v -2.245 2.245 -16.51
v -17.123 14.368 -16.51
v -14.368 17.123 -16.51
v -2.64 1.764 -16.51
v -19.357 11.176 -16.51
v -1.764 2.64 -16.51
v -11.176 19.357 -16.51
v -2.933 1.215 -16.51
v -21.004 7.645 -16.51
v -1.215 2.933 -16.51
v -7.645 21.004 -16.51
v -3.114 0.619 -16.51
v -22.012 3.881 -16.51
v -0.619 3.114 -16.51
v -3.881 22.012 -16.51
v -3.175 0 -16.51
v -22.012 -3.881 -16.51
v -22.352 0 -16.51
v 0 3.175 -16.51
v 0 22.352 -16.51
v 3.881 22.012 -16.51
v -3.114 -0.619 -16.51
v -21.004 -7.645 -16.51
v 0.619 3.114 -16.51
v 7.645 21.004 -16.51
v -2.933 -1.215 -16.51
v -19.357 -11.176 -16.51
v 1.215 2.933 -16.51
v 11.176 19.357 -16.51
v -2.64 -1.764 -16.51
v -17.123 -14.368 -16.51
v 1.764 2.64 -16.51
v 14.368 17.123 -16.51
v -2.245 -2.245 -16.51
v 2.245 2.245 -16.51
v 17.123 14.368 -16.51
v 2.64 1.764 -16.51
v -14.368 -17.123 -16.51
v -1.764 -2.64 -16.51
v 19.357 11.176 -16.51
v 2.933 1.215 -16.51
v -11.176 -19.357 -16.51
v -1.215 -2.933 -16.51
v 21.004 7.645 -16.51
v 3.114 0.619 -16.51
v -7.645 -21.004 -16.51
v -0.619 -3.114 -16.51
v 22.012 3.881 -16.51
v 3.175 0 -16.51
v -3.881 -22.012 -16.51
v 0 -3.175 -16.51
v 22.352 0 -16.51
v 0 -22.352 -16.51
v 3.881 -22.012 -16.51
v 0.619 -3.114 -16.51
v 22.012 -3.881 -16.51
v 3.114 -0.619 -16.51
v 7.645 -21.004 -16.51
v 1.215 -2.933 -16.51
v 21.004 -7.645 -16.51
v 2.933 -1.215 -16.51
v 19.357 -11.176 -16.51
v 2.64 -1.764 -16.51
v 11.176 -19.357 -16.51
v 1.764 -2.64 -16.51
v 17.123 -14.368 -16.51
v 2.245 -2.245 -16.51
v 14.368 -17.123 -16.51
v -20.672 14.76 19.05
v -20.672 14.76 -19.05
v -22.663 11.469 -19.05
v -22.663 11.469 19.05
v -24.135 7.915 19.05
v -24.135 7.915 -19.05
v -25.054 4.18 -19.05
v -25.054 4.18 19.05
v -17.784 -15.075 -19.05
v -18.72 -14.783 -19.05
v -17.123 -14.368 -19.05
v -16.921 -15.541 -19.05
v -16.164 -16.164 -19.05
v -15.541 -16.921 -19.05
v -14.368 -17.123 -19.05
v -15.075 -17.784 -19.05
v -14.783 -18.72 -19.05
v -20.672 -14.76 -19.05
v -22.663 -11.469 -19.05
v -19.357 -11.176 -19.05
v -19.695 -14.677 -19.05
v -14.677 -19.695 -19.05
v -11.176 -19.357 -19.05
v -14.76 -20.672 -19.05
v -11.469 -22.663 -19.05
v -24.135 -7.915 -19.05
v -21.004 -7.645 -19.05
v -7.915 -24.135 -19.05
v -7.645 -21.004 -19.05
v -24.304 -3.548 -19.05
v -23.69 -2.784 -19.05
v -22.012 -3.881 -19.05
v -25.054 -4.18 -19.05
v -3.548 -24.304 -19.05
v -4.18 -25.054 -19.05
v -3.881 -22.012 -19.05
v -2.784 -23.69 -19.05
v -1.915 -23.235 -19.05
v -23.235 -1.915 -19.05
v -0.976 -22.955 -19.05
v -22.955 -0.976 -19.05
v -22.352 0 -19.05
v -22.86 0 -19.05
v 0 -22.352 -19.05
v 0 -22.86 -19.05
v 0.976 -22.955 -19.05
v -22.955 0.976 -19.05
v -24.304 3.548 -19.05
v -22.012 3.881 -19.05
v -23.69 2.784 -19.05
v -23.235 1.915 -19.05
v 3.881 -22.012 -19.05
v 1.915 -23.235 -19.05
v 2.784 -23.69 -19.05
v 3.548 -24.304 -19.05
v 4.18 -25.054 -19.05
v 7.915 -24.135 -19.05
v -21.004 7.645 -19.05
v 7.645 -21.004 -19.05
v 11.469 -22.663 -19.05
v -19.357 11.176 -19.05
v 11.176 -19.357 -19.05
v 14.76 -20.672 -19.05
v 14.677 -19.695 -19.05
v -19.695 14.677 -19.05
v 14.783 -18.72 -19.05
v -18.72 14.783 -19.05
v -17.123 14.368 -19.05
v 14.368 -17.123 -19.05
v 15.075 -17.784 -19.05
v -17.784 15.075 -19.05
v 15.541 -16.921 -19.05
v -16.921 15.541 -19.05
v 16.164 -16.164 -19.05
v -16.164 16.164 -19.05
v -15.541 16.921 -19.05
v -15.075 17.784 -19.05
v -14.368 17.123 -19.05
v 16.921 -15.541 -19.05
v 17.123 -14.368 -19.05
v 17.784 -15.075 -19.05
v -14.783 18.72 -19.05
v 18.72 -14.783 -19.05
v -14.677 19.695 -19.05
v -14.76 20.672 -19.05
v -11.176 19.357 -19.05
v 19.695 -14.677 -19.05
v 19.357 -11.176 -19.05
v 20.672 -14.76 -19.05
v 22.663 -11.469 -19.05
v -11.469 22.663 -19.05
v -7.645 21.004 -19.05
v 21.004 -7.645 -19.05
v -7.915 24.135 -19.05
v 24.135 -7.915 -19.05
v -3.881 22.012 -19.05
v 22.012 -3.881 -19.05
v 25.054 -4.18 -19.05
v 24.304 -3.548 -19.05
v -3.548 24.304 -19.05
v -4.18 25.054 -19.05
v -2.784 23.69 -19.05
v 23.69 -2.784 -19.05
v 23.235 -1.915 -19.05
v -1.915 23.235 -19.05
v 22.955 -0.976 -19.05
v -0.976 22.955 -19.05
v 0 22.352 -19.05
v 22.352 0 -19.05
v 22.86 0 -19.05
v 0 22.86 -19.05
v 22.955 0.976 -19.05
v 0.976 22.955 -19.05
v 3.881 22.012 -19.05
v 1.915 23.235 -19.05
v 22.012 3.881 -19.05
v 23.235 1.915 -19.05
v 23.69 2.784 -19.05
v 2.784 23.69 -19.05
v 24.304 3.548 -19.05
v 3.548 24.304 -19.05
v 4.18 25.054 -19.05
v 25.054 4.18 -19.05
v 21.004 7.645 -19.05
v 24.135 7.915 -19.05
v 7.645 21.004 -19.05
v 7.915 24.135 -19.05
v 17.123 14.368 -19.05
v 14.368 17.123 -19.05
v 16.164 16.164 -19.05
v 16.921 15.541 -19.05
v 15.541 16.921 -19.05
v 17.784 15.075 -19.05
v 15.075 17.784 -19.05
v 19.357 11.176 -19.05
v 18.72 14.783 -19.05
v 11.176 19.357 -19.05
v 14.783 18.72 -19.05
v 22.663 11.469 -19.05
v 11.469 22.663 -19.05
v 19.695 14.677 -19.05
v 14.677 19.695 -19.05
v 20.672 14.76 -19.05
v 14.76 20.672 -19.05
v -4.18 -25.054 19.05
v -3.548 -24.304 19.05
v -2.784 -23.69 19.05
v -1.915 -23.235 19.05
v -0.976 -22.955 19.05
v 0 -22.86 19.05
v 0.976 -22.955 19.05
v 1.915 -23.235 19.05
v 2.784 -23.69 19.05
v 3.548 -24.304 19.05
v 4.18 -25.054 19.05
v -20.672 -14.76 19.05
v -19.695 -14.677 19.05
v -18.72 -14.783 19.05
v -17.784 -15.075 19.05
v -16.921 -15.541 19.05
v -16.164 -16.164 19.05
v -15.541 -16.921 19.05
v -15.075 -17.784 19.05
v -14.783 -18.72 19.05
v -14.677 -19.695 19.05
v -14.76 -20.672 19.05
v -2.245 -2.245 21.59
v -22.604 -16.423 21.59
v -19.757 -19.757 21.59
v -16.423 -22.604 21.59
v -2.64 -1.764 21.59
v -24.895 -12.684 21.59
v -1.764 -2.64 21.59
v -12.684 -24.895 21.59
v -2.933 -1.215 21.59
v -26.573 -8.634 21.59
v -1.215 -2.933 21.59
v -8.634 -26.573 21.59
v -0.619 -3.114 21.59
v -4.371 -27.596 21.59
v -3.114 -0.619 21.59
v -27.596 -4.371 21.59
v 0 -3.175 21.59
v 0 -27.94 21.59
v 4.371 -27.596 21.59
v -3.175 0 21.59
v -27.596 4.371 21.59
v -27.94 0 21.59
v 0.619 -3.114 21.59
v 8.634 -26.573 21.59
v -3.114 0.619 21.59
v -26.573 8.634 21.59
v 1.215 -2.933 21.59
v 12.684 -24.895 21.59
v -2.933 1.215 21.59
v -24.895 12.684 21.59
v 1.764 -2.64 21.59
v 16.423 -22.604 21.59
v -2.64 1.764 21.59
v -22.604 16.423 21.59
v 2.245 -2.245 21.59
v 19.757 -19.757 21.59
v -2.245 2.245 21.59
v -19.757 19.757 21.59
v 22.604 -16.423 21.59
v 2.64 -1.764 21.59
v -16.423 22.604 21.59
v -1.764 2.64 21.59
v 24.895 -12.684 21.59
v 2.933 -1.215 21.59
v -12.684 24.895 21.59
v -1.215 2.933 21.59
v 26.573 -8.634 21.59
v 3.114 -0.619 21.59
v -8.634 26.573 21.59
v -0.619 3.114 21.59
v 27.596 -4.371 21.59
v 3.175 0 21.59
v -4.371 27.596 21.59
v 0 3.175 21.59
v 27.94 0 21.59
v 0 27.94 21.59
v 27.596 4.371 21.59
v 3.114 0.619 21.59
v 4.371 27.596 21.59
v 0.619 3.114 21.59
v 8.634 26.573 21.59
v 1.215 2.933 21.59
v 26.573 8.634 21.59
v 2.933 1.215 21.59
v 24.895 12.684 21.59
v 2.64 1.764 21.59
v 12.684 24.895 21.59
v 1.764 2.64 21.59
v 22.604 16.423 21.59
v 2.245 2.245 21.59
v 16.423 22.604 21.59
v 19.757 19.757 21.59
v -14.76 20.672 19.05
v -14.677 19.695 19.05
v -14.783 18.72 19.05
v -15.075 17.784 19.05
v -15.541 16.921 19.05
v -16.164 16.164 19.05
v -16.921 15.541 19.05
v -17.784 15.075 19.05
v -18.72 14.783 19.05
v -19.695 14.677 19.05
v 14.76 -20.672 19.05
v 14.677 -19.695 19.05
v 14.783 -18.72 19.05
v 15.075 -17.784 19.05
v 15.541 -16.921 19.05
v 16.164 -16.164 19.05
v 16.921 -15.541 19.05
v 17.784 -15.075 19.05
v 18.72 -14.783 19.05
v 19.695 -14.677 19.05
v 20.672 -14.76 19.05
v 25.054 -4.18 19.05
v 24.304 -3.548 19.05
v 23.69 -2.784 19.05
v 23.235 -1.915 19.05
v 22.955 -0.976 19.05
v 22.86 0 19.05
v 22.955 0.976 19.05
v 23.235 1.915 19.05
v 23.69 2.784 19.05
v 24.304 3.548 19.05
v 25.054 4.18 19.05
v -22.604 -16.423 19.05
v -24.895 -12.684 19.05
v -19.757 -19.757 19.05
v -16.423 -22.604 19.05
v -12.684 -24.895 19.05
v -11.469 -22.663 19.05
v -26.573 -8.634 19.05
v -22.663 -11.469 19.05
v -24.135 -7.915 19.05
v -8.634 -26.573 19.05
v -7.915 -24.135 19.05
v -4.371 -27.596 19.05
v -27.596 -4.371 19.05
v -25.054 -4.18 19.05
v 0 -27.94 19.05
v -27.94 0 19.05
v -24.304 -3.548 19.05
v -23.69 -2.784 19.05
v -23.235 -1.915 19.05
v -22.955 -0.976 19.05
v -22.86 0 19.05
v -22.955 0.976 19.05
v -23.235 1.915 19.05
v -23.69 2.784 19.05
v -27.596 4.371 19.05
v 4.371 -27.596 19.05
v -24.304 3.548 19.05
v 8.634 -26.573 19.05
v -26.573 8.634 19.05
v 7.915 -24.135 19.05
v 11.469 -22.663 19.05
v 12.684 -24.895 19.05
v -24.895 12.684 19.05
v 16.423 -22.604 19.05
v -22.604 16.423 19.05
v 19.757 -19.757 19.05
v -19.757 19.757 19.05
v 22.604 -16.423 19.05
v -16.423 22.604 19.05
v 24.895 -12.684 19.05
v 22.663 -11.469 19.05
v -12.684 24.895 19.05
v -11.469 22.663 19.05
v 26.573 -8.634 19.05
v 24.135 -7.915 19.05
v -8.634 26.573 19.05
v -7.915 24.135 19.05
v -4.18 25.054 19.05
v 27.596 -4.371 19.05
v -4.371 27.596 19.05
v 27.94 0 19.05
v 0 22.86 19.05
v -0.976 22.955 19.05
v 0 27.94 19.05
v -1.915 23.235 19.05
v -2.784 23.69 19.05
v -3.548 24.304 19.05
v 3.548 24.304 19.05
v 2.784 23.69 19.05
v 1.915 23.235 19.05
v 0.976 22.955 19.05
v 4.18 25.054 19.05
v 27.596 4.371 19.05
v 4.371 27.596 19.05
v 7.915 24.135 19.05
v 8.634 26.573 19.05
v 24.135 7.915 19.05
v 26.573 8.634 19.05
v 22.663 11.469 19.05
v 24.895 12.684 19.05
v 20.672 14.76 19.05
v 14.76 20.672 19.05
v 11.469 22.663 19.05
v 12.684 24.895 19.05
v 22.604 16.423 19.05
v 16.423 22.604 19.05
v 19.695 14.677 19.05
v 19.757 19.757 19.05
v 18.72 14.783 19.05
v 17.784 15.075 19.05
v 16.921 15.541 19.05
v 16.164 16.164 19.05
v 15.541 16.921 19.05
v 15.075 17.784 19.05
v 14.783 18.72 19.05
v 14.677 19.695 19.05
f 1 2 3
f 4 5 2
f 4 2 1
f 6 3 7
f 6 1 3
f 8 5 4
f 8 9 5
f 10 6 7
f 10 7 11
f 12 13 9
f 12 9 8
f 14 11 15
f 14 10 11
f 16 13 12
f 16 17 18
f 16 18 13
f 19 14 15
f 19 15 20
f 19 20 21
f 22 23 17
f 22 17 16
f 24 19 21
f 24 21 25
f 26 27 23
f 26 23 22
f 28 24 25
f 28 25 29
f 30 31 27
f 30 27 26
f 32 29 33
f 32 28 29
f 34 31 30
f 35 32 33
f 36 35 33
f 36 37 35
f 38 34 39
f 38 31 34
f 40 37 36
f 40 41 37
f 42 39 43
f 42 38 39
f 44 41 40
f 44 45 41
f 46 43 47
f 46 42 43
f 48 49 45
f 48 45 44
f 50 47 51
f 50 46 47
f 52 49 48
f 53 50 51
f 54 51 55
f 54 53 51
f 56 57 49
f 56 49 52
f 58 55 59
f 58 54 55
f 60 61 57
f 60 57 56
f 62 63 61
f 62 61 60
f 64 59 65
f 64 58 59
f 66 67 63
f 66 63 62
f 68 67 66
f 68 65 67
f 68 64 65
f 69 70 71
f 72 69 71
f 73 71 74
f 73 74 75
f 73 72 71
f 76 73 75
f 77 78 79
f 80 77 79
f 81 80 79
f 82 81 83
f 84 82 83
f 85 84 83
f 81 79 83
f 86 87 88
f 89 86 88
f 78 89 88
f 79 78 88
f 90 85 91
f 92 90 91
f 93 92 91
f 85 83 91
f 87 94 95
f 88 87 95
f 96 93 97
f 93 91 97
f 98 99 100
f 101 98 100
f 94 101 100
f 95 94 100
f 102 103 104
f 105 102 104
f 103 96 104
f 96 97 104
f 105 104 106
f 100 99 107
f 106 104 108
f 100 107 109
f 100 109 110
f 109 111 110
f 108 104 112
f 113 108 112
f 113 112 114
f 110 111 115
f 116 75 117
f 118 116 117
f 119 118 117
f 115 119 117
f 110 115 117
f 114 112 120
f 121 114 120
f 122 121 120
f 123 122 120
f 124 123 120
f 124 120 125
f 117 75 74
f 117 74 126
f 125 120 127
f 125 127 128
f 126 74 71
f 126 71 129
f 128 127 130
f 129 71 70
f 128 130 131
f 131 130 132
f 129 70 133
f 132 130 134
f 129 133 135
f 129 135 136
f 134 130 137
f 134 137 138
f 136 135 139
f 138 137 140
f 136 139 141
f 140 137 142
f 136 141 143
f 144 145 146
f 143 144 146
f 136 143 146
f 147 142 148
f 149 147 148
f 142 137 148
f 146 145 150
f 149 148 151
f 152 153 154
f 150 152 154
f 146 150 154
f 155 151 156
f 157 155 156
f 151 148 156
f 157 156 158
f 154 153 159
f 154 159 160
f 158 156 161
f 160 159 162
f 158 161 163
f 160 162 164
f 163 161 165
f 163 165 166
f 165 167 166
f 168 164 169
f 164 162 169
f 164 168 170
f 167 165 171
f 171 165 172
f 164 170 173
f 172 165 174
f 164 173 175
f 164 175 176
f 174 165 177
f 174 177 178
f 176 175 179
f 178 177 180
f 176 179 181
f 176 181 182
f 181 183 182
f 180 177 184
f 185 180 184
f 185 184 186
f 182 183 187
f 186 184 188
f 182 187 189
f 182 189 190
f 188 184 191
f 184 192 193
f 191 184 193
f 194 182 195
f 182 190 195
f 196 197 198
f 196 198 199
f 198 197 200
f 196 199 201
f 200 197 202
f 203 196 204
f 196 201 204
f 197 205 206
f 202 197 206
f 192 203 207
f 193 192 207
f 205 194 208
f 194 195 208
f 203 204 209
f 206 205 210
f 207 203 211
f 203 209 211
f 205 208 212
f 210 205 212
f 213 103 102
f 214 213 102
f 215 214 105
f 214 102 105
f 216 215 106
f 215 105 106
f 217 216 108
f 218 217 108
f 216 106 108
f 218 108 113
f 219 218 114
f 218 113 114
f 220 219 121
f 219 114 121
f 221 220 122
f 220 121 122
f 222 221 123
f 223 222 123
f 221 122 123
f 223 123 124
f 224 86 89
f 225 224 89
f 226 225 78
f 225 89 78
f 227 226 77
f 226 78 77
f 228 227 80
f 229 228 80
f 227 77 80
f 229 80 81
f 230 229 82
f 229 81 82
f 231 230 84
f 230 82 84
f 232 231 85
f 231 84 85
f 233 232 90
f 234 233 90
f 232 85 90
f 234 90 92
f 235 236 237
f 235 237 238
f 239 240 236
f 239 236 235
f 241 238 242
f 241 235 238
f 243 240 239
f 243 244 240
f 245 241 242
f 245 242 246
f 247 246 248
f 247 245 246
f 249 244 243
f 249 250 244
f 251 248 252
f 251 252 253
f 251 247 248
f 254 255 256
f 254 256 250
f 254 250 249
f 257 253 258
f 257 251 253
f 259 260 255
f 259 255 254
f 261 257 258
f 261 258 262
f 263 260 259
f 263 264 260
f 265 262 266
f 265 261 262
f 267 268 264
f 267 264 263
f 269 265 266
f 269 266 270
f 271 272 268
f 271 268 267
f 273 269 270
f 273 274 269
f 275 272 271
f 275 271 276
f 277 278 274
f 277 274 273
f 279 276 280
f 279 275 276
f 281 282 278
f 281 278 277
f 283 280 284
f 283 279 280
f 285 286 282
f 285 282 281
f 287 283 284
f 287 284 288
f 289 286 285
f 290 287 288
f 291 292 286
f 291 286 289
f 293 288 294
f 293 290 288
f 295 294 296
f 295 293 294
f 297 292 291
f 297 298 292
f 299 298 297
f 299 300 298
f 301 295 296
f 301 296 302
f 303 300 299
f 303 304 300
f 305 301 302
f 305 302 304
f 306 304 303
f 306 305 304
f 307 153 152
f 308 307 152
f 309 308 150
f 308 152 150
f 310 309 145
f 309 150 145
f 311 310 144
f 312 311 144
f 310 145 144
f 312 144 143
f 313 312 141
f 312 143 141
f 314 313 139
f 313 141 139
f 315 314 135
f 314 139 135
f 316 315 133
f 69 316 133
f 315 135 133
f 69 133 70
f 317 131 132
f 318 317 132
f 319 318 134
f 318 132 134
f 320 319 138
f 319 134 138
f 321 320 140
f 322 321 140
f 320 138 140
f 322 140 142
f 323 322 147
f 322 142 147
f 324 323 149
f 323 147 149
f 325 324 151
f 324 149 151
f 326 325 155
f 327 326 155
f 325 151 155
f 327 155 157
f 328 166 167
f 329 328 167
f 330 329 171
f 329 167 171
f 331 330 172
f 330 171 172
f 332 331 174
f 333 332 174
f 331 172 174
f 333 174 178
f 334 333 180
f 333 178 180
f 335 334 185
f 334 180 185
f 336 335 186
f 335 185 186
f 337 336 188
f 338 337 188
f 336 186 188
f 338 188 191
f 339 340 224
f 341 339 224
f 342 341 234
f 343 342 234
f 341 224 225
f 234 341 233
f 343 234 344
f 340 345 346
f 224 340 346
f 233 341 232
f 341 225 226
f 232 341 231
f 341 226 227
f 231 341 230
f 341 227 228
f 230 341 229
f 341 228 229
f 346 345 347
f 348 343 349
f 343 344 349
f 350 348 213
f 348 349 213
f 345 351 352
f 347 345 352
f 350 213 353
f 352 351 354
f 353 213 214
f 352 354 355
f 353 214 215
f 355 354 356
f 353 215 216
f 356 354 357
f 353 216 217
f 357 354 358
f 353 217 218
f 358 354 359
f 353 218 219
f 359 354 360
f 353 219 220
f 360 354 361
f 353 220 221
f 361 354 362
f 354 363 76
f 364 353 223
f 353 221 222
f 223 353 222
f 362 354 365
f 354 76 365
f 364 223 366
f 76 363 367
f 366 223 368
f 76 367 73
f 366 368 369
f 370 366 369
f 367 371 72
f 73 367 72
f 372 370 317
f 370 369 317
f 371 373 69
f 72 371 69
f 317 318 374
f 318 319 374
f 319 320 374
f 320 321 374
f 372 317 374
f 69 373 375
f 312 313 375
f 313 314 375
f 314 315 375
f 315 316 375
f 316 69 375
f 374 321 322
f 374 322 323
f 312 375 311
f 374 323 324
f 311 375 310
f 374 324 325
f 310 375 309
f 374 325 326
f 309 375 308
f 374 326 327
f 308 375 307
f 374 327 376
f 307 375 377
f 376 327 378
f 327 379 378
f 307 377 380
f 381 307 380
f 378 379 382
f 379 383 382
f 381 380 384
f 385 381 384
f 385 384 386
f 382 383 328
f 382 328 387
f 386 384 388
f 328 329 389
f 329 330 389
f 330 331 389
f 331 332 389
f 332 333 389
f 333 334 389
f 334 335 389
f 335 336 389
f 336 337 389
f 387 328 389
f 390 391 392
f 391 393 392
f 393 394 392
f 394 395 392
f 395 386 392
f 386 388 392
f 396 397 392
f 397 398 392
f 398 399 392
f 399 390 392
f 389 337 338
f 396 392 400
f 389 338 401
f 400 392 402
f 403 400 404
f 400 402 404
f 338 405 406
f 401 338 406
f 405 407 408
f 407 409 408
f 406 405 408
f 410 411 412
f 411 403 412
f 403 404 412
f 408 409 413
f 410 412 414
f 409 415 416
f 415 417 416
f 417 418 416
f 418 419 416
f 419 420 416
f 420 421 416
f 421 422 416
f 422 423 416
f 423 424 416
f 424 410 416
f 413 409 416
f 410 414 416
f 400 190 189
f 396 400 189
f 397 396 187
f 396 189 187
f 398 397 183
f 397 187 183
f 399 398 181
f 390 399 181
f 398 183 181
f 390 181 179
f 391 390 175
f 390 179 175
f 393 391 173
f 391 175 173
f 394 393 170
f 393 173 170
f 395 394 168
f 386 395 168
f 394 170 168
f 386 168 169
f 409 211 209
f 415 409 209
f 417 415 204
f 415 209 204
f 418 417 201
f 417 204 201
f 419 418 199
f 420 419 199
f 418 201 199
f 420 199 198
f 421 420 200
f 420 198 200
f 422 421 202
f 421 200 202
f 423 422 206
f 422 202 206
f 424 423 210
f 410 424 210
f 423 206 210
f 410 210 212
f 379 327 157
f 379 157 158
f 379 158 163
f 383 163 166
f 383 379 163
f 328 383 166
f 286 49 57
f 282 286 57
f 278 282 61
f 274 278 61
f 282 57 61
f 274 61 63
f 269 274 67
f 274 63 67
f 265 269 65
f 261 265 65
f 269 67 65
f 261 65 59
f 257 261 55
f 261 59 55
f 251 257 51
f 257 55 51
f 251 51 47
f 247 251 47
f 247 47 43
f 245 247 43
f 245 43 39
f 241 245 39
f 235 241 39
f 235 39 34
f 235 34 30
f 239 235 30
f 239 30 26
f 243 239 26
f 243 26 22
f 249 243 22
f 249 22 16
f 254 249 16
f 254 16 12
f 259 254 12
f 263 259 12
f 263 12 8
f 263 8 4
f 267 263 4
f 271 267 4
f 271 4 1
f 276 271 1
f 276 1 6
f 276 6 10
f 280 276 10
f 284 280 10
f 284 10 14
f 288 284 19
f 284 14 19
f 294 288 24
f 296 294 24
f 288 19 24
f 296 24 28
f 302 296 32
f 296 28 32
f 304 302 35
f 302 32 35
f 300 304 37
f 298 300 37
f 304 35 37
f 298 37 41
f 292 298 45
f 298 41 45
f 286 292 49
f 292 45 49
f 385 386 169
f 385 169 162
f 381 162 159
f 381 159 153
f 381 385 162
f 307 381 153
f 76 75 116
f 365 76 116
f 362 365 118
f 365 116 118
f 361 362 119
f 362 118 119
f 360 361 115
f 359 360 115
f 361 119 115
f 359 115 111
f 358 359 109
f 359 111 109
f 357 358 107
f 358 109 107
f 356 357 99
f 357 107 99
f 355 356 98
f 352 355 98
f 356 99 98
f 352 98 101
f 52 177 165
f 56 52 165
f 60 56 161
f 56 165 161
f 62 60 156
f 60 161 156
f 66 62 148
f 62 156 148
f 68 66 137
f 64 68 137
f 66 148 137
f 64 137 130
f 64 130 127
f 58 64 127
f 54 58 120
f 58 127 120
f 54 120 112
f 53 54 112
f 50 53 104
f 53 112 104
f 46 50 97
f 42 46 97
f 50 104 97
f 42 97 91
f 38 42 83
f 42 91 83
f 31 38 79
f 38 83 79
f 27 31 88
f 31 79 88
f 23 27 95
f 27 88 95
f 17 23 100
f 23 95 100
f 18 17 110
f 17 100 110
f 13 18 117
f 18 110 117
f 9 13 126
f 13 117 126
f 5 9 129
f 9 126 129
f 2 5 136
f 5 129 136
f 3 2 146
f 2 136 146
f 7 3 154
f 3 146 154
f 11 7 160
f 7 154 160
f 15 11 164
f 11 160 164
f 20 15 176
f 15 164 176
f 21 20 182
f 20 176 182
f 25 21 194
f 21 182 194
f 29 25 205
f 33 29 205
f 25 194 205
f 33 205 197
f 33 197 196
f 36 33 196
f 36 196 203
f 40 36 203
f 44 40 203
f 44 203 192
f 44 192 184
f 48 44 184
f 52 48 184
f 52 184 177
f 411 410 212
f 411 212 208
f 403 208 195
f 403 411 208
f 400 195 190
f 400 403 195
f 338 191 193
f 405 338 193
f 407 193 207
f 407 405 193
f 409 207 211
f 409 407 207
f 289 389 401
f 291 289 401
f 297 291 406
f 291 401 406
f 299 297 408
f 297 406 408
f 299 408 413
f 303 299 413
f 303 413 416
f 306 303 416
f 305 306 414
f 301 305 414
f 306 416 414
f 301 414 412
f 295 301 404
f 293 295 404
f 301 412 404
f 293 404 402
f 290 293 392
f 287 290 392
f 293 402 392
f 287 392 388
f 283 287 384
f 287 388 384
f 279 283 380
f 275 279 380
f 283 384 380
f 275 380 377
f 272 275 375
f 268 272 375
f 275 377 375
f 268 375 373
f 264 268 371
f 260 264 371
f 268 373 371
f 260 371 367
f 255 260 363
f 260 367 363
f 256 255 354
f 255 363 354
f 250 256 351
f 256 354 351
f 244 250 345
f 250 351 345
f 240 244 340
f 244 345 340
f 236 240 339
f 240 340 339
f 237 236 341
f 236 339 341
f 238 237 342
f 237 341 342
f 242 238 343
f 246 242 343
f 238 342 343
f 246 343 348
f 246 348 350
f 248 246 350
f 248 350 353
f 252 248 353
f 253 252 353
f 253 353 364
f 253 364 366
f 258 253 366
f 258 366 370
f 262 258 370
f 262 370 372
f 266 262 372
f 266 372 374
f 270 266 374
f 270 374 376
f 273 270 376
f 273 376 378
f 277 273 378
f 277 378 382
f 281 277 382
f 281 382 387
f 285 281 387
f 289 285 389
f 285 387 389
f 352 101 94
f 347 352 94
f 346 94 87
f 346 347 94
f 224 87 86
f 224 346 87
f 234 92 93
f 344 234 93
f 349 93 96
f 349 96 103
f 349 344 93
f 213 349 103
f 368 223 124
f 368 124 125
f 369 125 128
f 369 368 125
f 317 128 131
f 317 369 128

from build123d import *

# Parameters (mm, degrees)
F0_R            = 25.4
F1_DEPTH        = 19.05
F2_R            = 27.94
F2_R_2          = 25.4
F3_DEPTH        = 2.54
F4_R            = 22.352
F5_DEPTH        = 2.54
F6_R            = 3.175
F7_DEPTH        = 38.101
F9_DEPTH        = 38.1
F9_COPIES_COUNT = 8


# Not quite as in the source:
# - a pattern or mirror of a feature is missing from the dataset's text; its kind, count and spacing are read off the source's solid


with BuildPart() as f1:
    # F0 (on Top) → F1 (new body, symmetric)
    with BuildSketch(Plane.XY):
        Circle(F0_R)
    extrude(amount=F1_DEPTH, both=True)

    # F2 (on face) → F3 (join)
    with BuildSketch(Plane.XY.offset(19.05)):
        Circle(F2_R)
        Circle(F2_R_2, mode=Mode.SUBTRACT)
        Circle(F2_R_2)
    extrude(amount=F3_DEPTH)

    # F4 (on face) → F5 (cut)
    with BuildSketch(Plane(origin=(0, 0, -19.05), x_dir=(1, 0, 0), z_dir=(0, 0, -1))):
        Circle(F4_R)
    extrude(amount=-F5_DEPTH, mode=Mode.SUBTRACT)

    # F6 (on face) → F7 (cut, through all)
    with BuildSketch(Plane(origin=(0, 0, -16.51), x_dir=(1, 0, 0), z_dir=(0, 0, -1))):
        Circle(F6_R)
    extrude(amount=-F7_DEPTH, mode=Mode.SUBTRACT)

    # F8 (on face) → F9 (cut, through all)
    with BuildSketch(Plane(origin=(0, 0, -19.05), x_dir=(1, 0, 0), z_dir=(0, 0, -1))):
        with BuildLine():
            ThreePointArc((4.1803474687, 25.0536363636), (0, 25.4), (-4.1803474687, 25.0536363636))
            ThreePointArc((-4.1803474687, 25.0536363636), (0, 22.86), (4.1803474687, 25.0536363636))
        make_face()
    f9 = extrude(amount=-F9_DEPTH, mode=Mode.SUBTRACT)

    # F9_copies: F9 ×8 about axis
    f9_copies_axis = Axis((0, 0, 0), (0, 0, 1))
    for i in range(1, F9_COPIES_COUNT):
        add(f9.rotate(f9_copies_axis, i * 360 / F9_COPIES_COUNT), mode=Mode.SUBTRACT)


solid = f1.part
